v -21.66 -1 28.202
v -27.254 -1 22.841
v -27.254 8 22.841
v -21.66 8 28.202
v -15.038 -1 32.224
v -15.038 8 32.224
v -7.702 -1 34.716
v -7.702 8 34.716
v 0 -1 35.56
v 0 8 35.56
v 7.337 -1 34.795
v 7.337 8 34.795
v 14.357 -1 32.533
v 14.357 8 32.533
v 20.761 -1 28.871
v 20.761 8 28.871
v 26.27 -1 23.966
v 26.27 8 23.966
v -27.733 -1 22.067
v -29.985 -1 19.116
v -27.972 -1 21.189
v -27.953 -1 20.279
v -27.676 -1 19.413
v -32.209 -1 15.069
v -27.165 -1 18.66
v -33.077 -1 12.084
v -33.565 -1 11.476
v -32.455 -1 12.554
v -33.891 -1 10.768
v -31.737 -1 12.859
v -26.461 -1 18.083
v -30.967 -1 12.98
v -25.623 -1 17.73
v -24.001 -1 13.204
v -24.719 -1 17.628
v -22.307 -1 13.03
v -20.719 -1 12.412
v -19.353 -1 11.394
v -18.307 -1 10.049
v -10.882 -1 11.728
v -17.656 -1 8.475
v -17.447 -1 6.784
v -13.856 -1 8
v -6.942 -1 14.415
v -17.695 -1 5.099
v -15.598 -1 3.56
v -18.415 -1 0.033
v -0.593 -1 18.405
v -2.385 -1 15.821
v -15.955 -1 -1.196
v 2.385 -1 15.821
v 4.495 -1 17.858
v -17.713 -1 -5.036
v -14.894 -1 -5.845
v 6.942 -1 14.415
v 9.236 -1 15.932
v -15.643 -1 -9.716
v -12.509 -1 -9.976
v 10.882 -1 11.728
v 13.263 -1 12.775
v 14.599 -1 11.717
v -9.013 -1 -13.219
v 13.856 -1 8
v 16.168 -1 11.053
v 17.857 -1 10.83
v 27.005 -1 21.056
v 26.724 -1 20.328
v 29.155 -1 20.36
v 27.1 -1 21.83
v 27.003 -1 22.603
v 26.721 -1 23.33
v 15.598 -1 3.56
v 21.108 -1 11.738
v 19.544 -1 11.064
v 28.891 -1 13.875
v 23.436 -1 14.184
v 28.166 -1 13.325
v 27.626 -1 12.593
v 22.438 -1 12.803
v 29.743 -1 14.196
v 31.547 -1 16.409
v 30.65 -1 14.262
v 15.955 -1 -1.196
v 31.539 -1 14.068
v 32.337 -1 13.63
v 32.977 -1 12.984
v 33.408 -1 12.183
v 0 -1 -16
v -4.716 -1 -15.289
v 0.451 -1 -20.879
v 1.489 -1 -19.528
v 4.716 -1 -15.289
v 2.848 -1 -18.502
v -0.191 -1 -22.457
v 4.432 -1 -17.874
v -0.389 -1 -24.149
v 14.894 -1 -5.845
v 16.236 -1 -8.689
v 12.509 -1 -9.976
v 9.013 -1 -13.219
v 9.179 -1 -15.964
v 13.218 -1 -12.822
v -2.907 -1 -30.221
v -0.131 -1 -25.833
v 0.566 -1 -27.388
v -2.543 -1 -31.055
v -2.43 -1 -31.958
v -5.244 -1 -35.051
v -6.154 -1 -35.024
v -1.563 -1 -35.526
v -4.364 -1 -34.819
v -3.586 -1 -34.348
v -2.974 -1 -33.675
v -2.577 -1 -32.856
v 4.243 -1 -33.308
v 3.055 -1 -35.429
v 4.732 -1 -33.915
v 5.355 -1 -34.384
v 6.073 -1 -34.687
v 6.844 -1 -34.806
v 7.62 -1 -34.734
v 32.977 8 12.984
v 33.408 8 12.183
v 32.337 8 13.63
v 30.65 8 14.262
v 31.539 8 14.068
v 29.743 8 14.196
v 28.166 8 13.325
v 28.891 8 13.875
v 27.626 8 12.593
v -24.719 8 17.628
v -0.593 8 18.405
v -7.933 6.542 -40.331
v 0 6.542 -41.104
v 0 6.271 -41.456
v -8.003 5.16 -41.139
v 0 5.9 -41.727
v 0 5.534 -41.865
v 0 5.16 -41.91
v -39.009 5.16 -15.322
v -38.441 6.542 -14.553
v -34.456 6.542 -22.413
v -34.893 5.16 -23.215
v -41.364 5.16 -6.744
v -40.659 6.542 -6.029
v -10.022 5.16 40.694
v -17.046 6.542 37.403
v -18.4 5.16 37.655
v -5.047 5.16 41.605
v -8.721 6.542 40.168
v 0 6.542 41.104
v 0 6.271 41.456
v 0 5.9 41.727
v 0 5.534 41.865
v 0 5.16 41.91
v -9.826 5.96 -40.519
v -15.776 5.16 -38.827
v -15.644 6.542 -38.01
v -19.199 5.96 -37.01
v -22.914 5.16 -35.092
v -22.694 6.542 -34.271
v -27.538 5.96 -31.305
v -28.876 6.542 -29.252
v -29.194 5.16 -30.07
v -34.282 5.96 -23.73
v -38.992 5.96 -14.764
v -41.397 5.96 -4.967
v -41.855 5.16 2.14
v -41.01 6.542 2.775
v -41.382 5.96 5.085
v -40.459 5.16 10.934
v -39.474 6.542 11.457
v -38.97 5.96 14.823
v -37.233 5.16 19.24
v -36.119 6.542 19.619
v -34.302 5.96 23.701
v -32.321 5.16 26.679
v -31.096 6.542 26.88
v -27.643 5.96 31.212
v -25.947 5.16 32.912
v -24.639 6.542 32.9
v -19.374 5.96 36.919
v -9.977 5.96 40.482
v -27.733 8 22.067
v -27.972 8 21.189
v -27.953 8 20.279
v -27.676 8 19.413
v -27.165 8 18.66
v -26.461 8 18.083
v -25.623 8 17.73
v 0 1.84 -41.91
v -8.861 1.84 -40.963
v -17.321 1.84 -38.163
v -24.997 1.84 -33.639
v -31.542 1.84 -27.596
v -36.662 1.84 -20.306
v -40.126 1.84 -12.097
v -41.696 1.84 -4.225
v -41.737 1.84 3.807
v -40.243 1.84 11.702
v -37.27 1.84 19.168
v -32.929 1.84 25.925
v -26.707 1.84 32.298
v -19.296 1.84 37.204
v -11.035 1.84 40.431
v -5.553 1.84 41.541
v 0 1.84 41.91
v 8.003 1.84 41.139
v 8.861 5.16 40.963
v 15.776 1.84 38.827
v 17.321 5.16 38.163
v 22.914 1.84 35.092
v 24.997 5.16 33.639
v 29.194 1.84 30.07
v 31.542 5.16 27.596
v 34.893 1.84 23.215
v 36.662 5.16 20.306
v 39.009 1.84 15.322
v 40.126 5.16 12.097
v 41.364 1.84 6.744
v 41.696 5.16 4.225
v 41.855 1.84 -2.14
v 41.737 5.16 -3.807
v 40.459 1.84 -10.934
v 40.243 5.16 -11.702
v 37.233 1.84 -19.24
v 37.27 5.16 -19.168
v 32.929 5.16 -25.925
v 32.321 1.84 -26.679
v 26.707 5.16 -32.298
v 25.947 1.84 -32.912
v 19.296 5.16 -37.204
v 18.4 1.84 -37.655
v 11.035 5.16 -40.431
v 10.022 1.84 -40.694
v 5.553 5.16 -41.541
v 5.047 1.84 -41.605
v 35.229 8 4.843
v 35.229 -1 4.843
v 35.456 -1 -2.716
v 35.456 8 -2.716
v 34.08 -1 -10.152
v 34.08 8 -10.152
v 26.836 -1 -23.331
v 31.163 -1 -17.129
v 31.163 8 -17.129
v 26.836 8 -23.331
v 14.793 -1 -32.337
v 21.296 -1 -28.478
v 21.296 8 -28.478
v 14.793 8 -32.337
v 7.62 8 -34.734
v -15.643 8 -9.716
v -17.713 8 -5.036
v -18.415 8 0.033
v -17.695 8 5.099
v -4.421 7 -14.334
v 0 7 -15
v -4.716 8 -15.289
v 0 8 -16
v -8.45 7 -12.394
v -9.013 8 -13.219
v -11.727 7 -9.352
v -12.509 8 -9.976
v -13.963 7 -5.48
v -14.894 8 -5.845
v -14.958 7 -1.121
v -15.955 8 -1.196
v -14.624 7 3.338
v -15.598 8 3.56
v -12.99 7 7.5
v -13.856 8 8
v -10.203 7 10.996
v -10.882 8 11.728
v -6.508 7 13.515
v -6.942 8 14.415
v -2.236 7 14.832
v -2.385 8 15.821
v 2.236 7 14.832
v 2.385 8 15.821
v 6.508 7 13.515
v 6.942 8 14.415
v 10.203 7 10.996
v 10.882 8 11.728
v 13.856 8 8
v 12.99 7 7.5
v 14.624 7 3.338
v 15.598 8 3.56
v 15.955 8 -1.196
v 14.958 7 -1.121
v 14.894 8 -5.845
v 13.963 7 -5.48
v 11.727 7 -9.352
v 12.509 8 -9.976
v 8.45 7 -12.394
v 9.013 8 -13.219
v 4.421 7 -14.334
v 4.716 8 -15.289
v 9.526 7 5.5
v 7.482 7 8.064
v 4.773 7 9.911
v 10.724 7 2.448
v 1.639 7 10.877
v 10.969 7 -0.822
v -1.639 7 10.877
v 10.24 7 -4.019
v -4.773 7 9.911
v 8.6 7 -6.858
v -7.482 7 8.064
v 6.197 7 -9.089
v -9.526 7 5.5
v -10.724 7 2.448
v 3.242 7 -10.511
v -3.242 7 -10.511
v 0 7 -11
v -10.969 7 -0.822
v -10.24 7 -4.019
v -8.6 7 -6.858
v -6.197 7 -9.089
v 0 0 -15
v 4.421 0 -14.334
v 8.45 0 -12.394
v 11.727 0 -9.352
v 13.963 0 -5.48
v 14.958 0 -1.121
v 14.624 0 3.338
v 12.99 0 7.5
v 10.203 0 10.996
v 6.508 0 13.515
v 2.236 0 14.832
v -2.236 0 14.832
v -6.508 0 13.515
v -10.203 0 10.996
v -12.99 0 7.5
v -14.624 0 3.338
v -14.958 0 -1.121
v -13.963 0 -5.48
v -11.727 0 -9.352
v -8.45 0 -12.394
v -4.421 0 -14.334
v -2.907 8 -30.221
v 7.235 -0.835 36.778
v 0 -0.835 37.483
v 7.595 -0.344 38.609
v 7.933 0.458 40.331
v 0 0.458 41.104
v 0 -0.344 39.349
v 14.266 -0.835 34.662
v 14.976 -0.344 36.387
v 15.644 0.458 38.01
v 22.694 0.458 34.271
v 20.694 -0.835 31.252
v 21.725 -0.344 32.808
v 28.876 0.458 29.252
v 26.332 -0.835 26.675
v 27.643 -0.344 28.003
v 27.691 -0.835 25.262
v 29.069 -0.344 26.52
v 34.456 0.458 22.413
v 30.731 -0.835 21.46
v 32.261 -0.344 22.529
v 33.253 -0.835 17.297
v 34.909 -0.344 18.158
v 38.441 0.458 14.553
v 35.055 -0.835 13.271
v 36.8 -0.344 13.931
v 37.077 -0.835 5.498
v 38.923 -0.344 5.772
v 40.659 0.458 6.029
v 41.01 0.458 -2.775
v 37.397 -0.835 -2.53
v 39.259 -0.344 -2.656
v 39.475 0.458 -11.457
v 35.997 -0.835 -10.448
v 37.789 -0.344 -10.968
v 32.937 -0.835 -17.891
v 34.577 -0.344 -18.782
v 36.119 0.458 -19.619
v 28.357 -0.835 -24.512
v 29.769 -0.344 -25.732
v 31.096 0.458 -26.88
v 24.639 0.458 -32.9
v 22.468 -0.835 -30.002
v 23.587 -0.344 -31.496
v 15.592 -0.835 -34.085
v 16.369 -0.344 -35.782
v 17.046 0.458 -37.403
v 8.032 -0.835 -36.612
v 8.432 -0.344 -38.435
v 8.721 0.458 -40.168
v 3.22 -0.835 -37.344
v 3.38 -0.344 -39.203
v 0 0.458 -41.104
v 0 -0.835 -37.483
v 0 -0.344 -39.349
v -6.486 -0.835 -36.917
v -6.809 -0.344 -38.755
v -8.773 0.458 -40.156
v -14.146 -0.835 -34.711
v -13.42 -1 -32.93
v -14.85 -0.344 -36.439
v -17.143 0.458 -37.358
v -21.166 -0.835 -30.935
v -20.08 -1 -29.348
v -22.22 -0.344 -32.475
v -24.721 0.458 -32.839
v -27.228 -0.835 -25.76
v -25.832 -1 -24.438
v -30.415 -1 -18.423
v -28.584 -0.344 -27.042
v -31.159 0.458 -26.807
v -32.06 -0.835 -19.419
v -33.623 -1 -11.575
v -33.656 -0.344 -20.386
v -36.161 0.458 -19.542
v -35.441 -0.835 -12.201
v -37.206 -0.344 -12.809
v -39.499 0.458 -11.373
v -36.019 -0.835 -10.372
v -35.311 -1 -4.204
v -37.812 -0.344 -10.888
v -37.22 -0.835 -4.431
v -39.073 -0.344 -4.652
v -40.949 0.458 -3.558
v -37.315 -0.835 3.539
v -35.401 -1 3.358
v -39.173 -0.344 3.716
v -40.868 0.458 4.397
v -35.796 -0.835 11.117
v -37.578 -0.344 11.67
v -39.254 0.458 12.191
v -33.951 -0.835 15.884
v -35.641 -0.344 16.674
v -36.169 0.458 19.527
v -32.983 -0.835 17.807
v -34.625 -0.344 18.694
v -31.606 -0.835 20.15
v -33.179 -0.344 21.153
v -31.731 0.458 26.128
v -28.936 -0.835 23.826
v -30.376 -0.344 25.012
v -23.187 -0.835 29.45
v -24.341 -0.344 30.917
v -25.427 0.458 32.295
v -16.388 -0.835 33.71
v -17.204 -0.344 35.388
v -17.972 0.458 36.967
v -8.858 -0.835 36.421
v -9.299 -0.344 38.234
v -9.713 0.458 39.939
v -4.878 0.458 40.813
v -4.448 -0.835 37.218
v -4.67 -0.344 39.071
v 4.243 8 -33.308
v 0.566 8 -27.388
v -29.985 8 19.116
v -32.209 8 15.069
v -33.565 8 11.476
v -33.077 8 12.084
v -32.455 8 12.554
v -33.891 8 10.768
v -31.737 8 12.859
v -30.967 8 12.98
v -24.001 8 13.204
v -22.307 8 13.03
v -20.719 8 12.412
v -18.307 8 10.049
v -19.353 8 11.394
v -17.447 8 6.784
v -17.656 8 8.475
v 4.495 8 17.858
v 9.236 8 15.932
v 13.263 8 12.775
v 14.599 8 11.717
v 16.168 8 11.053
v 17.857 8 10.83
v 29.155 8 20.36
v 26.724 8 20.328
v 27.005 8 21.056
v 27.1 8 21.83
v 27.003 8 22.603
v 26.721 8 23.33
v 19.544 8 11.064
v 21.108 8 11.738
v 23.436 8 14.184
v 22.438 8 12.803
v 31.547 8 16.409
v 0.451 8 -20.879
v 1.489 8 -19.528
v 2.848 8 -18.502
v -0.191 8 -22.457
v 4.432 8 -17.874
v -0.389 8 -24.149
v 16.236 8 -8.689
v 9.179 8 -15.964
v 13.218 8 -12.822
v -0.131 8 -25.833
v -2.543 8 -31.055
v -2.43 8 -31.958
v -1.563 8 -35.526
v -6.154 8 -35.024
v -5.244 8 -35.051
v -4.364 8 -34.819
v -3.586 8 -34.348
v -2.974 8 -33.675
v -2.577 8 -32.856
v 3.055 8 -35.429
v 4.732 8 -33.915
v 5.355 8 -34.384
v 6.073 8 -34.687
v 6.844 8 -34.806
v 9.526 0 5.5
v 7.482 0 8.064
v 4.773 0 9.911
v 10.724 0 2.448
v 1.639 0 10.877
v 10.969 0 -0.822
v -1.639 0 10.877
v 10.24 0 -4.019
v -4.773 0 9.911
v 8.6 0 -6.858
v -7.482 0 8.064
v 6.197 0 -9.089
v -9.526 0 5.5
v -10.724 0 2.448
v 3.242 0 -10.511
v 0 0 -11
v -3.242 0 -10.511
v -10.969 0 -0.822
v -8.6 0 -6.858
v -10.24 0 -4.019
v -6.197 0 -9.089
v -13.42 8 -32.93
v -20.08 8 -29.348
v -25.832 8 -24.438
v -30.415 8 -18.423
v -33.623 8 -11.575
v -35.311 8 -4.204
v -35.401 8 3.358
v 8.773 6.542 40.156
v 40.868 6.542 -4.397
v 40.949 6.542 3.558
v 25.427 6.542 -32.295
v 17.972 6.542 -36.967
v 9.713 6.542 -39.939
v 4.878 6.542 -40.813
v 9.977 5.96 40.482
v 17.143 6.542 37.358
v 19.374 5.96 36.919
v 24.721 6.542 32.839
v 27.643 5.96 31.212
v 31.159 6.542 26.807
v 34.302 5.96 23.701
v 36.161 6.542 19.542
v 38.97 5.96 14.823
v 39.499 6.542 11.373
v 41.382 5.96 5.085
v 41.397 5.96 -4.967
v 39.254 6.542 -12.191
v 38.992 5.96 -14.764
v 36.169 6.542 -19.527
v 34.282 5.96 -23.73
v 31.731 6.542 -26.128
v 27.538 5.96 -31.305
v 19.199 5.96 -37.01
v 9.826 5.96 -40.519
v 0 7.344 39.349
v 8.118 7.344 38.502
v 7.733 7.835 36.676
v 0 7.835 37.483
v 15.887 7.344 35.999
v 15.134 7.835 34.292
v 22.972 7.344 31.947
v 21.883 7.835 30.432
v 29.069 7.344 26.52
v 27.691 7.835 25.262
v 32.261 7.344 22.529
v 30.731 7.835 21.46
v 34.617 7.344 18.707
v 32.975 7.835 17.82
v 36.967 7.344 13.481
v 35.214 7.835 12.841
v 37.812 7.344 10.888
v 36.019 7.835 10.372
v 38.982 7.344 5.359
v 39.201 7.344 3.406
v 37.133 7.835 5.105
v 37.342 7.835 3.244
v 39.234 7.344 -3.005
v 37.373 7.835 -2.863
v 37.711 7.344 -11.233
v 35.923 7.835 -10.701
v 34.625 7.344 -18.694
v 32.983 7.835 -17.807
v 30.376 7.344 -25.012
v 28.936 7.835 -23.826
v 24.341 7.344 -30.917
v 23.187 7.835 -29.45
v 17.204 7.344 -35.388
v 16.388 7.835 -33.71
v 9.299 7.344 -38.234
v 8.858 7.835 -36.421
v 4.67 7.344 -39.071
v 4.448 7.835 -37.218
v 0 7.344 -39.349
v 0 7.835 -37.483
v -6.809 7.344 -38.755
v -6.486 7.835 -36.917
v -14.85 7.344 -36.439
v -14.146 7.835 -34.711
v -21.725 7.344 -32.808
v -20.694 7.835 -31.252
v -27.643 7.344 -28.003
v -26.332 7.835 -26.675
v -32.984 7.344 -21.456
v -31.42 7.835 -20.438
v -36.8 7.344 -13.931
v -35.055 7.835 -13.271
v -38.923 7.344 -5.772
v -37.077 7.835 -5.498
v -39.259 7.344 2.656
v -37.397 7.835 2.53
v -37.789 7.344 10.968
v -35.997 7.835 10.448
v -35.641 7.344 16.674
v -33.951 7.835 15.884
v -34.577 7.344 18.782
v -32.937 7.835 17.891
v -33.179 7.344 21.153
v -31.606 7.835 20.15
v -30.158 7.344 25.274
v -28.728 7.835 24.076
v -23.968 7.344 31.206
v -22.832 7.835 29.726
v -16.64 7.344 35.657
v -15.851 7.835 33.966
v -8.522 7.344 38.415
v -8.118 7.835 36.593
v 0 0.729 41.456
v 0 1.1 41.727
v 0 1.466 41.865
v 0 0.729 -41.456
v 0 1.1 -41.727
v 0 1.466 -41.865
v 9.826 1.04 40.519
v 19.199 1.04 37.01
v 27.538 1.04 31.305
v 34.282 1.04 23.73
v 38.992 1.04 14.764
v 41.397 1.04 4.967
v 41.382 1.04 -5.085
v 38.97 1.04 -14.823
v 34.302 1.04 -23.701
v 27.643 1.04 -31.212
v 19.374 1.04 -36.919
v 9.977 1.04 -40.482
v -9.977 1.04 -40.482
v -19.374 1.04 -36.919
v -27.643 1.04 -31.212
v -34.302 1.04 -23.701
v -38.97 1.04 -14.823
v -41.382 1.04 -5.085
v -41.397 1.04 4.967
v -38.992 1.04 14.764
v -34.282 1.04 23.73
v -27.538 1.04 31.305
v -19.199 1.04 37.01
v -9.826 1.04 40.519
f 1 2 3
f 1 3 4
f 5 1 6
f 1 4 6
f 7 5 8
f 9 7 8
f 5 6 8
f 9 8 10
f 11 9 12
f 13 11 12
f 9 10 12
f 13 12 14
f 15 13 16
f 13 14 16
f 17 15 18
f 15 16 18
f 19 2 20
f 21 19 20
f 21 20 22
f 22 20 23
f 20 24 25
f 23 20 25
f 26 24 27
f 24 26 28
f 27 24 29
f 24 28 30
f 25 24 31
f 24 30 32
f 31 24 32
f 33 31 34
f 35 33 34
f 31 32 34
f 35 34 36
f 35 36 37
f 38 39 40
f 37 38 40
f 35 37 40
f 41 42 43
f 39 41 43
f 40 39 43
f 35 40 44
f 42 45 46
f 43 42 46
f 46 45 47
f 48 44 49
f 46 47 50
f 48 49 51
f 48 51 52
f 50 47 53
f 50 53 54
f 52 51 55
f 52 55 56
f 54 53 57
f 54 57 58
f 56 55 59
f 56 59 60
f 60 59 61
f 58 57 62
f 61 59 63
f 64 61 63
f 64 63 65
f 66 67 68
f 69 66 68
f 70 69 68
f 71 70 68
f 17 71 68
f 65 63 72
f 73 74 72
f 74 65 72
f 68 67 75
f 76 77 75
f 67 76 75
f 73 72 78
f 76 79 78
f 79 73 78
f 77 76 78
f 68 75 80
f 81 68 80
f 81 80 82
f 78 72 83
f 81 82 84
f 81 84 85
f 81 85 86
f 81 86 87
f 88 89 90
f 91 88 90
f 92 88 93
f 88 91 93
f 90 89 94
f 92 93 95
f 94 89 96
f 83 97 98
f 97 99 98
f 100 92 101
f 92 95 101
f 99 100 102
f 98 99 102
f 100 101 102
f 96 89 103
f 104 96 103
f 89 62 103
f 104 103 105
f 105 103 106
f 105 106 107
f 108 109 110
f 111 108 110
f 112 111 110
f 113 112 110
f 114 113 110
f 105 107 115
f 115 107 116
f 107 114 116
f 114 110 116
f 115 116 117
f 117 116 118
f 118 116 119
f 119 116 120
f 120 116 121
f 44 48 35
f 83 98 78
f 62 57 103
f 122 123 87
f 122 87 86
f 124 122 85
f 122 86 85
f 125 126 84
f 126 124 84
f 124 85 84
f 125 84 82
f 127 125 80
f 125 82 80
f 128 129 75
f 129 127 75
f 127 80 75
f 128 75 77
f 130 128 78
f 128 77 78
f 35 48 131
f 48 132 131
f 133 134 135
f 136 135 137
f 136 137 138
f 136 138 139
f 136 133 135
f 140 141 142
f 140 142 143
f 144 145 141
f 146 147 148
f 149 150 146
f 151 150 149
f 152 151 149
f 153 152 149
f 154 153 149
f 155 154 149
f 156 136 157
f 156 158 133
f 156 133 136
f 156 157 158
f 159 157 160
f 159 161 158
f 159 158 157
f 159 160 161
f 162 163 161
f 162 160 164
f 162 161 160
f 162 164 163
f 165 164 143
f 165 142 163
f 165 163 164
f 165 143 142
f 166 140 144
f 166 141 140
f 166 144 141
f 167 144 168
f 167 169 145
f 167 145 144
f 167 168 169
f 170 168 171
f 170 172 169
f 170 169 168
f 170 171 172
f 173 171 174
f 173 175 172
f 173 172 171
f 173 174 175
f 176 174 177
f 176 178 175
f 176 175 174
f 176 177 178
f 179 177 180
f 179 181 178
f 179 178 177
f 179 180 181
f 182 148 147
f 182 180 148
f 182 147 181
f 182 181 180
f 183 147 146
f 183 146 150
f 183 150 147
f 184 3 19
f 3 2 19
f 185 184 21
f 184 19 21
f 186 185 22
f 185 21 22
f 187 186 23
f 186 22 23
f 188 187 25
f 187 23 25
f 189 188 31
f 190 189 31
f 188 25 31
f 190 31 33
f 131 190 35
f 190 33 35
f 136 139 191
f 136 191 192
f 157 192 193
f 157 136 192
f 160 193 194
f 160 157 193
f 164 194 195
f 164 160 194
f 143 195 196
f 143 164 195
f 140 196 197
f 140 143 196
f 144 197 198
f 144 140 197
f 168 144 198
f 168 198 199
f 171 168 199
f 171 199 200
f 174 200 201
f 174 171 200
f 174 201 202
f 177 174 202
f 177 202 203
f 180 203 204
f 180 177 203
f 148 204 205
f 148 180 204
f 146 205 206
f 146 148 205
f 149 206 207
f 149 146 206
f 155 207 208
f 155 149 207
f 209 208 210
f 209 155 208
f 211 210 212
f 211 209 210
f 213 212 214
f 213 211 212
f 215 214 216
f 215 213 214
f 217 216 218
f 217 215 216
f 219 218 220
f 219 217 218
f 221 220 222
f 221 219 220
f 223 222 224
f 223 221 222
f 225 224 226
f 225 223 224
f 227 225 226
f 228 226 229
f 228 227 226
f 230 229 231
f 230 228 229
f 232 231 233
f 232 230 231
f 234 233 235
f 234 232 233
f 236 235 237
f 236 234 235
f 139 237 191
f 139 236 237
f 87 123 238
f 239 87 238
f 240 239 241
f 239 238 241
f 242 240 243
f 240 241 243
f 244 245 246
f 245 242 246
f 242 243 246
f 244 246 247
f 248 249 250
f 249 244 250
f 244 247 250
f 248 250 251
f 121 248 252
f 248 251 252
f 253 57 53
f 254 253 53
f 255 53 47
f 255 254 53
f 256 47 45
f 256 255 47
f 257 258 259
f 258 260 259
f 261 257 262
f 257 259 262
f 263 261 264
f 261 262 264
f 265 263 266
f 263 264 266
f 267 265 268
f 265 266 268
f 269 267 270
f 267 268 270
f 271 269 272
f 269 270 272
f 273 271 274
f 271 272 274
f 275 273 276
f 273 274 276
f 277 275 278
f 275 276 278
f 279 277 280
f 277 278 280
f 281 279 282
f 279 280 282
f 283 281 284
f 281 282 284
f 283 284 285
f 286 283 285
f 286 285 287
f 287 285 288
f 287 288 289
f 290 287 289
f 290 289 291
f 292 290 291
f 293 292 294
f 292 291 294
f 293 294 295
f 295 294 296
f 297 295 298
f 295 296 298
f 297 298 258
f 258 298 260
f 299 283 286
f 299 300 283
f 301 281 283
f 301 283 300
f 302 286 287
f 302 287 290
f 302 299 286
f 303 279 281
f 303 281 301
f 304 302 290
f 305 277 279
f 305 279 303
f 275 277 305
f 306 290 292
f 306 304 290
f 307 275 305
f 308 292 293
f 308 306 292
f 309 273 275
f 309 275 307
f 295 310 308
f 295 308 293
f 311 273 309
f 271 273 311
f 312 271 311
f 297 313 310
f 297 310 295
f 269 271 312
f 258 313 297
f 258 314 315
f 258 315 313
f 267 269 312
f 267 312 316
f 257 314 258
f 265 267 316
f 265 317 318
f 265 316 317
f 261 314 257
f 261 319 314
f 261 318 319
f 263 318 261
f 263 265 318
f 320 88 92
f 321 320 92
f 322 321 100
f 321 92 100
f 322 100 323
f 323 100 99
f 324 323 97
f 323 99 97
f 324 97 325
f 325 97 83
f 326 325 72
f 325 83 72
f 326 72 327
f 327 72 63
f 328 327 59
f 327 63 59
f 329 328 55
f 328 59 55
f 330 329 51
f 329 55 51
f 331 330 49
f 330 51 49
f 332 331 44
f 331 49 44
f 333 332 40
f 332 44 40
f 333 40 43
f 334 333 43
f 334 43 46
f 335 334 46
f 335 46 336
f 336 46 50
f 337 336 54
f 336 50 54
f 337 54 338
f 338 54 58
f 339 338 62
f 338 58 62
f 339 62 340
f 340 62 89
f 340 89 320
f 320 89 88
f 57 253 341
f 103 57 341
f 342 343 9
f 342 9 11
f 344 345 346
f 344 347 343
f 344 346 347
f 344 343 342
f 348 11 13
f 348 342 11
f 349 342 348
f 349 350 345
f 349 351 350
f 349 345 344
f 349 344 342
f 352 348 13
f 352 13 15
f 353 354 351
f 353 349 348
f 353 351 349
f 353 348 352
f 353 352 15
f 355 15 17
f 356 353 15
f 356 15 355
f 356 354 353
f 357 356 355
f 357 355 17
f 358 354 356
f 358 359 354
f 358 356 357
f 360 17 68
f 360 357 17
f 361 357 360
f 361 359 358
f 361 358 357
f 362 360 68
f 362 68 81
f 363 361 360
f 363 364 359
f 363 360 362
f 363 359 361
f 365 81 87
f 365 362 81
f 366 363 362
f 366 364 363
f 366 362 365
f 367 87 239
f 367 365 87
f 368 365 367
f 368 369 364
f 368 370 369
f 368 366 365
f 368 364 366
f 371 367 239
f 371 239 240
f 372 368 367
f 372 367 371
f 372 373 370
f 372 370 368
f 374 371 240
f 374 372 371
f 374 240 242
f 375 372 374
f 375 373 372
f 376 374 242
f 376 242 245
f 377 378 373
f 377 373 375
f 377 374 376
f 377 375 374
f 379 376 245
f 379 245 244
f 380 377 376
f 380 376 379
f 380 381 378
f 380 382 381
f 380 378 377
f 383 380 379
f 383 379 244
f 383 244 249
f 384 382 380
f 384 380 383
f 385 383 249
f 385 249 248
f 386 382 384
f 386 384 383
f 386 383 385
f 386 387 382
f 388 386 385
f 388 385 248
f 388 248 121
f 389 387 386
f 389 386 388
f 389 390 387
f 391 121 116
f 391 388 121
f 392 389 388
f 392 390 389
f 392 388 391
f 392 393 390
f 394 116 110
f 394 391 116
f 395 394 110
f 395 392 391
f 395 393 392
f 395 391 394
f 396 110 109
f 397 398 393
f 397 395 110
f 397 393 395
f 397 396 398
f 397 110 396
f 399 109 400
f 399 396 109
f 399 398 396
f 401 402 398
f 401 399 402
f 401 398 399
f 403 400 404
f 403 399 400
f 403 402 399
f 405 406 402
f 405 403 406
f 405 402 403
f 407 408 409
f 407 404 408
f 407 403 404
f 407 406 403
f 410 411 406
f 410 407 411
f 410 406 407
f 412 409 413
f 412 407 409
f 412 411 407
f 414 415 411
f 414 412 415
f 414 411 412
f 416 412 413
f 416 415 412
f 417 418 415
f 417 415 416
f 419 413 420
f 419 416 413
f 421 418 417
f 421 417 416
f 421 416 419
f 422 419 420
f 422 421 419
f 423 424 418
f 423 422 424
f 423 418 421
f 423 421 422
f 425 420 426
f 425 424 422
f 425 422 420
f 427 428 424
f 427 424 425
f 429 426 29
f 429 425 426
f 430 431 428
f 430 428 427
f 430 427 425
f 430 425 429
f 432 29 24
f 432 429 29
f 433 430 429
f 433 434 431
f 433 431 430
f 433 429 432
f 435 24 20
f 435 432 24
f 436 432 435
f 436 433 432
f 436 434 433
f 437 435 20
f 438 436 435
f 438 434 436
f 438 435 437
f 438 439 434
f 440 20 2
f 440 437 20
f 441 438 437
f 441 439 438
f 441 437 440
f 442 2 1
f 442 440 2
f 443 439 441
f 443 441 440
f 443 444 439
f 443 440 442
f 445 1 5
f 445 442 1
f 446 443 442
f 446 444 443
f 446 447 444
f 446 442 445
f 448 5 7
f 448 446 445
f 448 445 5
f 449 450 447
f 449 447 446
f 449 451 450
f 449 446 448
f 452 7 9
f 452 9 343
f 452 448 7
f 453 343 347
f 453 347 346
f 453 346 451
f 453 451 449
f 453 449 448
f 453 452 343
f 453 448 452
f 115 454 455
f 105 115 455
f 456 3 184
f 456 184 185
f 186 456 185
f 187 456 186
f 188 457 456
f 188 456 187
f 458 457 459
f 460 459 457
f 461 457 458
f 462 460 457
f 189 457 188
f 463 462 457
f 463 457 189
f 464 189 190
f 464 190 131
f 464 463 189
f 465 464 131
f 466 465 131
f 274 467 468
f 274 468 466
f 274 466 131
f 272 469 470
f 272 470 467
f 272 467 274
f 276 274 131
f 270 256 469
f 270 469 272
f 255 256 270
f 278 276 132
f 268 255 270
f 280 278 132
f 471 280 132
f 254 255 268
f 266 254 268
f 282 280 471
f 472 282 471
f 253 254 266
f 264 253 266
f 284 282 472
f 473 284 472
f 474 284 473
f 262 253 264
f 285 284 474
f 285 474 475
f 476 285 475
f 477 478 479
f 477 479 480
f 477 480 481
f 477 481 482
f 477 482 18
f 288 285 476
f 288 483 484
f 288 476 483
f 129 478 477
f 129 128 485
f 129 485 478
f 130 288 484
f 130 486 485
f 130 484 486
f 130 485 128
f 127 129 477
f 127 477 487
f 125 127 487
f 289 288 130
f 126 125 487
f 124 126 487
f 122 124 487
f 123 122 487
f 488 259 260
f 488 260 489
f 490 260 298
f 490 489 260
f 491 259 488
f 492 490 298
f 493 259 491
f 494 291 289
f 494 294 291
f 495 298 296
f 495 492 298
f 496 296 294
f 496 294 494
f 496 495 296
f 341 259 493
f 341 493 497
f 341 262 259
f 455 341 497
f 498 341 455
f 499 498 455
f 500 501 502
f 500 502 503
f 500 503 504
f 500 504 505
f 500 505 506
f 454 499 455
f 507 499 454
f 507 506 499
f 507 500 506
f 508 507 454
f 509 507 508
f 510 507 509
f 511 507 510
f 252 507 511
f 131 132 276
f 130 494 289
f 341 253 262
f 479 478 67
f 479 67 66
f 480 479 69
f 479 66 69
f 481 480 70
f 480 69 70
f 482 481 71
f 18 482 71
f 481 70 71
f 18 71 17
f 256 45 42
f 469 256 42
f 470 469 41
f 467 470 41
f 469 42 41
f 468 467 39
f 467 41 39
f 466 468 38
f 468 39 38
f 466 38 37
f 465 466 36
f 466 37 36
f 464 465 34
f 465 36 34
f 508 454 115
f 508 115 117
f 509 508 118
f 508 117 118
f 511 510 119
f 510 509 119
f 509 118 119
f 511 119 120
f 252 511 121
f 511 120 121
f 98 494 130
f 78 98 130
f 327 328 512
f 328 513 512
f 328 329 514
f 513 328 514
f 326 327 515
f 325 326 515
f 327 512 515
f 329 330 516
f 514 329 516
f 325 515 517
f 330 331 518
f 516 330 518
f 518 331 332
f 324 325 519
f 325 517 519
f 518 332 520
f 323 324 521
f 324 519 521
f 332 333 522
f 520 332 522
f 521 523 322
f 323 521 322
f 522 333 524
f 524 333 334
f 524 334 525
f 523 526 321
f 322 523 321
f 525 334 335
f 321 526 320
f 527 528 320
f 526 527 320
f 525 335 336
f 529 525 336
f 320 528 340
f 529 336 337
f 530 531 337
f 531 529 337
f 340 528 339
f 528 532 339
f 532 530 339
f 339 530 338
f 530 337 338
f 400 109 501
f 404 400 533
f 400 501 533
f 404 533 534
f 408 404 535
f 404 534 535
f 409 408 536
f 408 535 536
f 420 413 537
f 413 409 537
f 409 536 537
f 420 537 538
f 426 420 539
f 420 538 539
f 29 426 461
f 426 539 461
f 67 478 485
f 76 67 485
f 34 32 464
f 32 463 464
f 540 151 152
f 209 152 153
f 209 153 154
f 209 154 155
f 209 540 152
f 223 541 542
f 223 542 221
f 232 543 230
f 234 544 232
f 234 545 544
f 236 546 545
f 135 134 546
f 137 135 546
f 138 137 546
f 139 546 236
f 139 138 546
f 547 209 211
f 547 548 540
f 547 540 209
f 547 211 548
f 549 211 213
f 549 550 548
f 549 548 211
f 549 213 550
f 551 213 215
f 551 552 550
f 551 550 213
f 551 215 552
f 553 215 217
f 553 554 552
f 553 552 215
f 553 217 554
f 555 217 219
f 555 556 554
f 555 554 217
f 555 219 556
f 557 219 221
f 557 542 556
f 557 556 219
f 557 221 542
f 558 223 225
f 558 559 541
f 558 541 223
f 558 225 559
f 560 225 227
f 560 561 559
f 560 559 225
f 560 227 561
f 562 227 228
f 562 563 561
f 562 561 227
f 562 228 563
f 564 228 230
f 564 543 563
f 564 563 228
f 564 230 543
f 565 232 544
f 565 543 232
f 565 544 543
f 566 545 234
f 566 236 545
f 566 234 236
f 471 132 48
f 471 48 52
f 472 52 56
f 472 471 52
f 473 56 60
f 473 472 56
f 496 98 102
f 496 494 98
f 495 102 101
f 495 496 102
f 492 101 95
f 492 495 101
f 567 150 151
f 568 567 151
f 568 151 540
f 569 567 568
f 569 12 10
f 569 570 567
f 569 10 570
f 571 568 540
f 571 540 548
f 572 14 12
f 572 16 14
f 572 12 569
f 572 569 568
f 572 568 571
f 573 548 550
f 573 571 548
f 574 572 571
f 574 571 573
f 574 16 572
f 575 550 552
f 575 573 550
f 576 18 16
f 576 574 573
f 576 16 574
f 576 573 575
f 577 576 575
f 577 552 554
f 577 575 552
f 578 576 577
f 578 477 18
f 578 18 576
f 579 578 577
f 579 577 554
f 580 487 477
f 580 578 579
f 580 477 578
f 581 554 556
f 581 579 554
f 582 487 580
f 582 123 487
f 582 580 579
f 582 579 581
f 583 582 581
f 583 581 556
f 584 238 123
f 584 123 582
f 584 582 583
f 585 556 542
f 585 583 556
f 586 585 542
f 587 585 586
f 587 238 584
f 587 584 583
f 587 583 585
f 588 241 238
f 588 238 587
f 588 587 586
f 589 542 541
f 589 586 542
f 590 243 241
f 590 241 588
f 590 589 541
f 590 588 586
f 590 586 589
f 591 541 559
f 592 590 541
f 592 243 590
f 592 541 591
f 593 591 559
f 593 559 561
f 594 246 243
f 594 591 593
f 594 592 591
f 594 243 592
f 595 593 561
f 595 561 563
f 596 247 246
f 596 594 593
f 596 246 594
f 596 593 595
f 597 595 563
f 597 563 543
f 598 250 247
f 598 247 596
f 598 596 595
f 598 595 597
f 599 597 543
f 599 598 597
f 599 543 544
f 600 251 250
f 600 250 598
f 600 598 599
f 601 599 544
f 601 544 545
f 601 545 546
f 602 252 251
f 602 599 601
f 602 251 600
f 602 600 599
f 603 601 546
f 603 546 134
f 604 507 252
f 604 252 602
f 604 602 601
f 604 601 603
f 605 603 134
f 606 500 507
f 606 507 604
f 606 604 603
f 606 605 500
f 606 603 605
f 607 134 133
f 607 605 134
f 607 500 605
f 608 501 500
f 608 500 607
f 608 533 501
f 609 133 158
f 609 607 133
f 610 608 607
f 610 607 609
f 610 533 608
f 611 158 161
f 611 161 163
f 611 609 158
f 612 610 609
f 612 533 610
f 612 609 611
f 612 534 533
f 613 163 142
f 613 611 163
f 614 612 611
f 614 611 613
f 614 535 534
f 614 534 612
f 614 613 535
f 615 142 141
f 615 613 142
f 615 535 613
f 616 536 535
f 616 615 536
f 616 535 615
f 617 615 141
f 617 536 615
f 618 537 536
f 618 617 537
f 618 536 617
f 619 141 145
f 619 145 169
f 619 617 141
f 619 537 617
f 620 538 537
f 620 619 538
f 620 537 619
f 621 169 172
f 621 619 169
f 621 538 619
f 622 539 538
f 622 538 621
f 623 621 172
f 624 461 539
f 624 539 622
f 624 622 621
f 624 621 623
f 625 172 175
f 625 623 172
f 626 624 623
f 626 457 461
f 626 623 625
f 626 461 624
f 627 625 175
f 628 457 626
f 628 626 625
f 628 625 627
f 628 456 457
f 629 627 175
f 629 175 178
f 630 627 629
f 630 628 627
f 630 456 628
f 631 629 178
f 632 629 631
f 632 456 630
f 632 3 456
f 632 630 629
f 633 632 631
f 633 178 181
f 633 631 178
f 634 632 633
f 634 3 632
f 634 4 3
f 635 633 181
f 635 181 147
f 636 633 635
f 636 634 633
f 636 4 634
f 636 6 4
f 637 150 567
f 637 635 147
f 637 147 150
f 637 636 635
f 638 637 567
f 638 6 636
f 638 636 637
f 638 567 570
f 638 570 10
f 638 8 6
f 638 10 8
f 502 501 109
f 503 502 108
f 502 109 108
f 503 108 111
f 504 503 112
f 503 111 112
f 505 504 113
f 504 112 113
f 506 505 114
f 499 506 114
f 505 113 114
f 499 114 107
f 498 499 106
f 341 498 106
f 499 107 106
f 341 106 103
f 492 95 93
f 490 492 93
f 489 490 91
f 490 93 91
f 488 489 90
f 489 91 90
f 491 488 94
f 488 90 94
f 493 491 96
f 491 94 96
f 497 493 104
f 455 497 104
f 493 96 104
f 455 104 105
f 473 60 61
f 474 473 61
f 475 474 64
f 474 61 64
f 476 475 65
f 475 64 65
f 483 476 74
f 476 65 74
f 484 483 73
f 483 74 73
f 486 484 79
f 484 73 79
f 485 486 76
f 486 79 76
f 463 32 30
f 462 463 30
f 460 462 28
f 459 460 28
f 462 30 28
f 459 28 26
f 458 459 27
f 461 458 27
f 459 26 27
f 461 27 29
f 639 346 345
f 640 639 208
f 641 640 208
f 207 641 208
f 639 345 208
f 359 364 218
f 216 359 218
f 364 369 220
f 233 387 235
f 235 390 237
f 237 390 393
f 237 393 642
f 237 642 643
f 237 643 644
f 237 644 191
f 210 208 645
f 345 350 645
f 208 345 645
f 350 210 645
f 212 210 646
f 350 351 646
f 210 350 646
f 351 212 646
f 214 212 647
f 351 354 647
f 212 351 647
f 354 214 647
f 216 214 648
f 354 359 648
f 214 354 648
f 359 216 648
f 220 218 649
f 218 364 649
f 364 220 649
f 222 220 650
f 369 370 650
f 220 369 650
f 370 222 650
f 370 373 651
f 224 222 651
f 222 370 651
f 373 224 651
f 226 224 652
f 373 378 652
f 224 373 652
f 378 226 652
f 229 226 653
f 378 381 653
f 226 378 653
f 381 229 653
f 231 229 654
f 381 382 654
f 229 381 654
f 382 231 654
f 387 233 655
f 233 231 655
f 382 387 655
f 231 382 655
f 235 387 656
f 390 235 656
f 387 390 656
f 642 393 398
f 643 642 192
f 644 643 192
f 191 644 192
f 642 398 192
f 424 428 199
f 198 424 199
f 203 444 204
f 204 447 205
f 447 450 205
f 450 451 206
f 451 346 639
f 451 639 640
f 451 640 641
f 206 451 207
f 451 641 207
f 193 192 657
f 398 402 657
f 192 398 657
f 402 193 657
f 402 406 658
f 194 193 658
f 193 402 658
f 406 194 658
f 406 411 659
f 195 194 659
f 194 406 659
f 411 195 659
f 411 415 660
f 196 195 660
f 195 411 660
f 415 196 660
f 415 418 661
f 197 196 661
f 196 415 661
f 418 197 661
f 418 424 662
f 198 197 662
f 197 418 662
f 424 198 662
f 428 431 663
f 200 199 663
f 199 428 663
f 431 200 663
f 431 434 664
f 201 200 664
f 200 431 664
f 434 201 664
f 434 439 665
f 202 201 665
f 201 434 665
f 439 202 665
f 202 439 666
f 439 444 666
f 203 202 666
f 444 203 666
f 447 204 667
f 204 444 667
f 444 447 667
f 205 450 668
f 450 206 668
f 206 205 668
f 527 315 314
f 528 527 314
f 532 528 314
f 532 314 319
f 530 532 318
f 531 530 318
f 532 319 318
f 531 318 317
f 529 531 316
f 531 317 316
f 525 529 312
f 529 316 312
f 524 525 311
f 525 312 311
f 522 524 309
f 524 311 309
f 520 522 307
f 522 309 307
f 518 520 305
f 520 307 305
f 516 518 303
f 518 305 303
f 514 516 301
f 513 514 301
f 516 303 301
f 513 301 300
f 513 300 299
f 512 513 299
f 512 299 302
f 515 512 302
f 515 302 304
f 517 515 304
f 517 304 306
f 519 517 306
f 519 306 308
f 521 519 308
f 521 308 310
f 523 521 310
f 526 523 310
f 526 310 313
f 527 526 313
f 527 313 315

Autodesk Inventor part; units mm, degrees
ref_plane "YZ Plane" through (0, 0, 0) normal (1, 0, 0) x (0, 1, 0)
sketch "Sketch3" plane through (0, 0, 0) normal (1, 0, 0) x (0, 1, 0)
  line L0 (0, 0) -> (0, -11) construction
  line L1 (0, 0) -> (7, 0) construction
  line L2 (7, 0) -> (7, -11) construction
  line L3 (0, -11) -> (0, -41.91)
  line L4 (0, -41.91) -> (-1.9706, -41.91) construction
  line L5 (0, -11) -> (7, -11)
  line L6 (7, -11) -> (7, -41.91)
  line L7 (0, -41.91) -> (0, -39.6842) construction
  line L8 (0, -41.91) -> (7, -41.91)
  dimension "d7" = 7
  dimension "d8" = 11
  dimension "d9" = 41.91
revolve "Revolution1" add sketch "Sketch3" angle 360 about axis through (0, 0, 0) along (0, 1, 0)
ref_plane "Work Plane2" through (0, 0, 0) normal (-1, 0, 0) x (0, 1, 0)
sketch "Sketch4" plane through (0, 0, 0) normal (-1, 0, 0) x (0, 1, 0)
  line L0 (0, 0) -> (7, 0)
  line L1 (7, 41.91) -> (7, -41.91) projected
  line L2 (7, 0) -> (7, 11)
  line L3 (7, 0) -> (8, 0)
  line L4 (8, 0) -> (8, 15)
  line L5 (8, 15) -> (7, 15)
  line L6 (8, 15) -> (8, 41.91)
  line L7 (8, 41.91) -> (7, 41.91)
  line L8 (0, 0) -> (0, 0.75)
  line L9 (0, 11) -> (0, -11) projected
  line L10 (8, 15) -> (0, 15)
  line L11 (0, 41.91) -> (0, -41.91) projected
  line L12 (0, 15) -> (-1, 15)
  line L13 (-1, 15) -> (-1, 41.91)
  line L14 (-1, 41.91) -> (0, 41.91)
  dimension "d16" = 11
  dimension "d17" = 1
  dimension "d18" = 15
  dimension "d20" = 0.75
  dimension "d21" = 1
ref_plane "Work Plane3" through (0, 3.5, 0) normal (0, 1, 0) x (1, 0, 0)
revolve "Revolution2" add sketch "Sketch4" angle 360 about axis through (0, 0, 0) along (0, 1, 0) contours L12 L13 L14 L11 | L1 L7 L6 L5
sketch "Sketch5" plane through (0, 8, 0) normal (0, 1, 0) x (1, 0, 0)
  circle A0 centre (0, 0) radius 18.415
  circle A1 centre (0, 0) radius 15 projected
  circle A2 centre (0, 0) radius 41.91 projected
  circle A3 centre (0, 0) radius 35.56
  dimension "d23" = 6.35
  dimension "d49" = 36.83
extrude "Extrusion2" cut sketch "Sketch5" against normal through all contours A3
sketch "Sketch6" plane through (0, 8, 0) normal (0, 1, 0) x (1, 0, 0)
  circle A0 centre (0, 0) radius 18.415 projected
  circle A1 centre (0, 0) radius 35.56 projected
  line L0 (16.2361, 8.6892) -> (30.5901, -18.1318)
  line L1 (27.7471, -22.2399) -> (17.9783, -3.9865)
  dimension "d26" = 4.445
extrude "Extrusion3" add sketch "Sketch6" against normal up to surface (9 mm away) contours A0 L0 A1 L1 picked at (22.3912, -5.043)
pattern_circular "Circular Pattern1" count 3 over 360 about axis through (0, 3.5, 0) along (0, -1, 0) of "Extrusion3"
fillet "Fillet1" radius 6.35 3 edges at (-5.5367, 3.5, -17.5629) (17.9783, 3.5, 3.9865) (-12.4416, 3.5, 13.5764)
fillet "Fillet1" radius 3.175 3 edges at (27.7471, 3.5, 22.2399) (-33.1338, 3.5, 12.9098) (5.3867, 3.5, -35.1496)
fillet "Fillet1" radius 3.175 3 edges at (0.4075, 3.5, -35.5577) (-30.9976, 3.5, 17.4259) (30.5901, 3.5, 18.1318)
sketch "Sketch7" plane through (0, 0, 0) normal (-1, 0, 0) x (0, 1, 0)
  line L0 (8, -41.91) -> (8, 41.91) projected
  line L1 (-1, -41.91) -> (-1, 41.91) projected
  line L2 (8, -41.91) -> (-1, -41.91) projected
  arc A0 (6.04, -41.91) -> (8, -35.56) centre (-3.2664, -35.56) ccw
  arc A1 (-1, -35.56) -> (0.96, -41.91) centre (10.2664, -35.56) ccw
  line L3 (0.96, -41.91) -> (6.04, -41.91)
  line L4 (-1, -35.56) -> (8, -35.56)
  line L5 (8, -22.8409) -> (-1, -22.8409) projected
  line L6 (8, -23.9663) -> (8, -35.56) projected
  line L7 (-1, -23.9663) -> (8, -23.9663) projected
  line L8 (-1, -22.8409) -> (-1, -23.9663) projected
  line L9 (8, -35.56) -> (8, -35.56) projected
  line L10 (0, 0) -> (11.7377, 0)
  dimension "d36" = 6.35
  dimension "d37" = 5.08
revolve "Revolution3" cut sketch "Sketch7" angle 360 about axis through (0, 0, 0) along (0, 1, 0) contours L2 A0 L0 | A1 L2 L1
fillet "Fillet2" radius 1.5875 4 edges at (41.91, 6.04, 0) (-41.91, 6.04, 0) (-41.91, 0.96, 0) (41.91, 0.96, 0)
chamfer "Chamfer1" distance 1 distance2 1 1 edges at (0, 8, 15) measured on face at (1.207, 7.3333, -14.9514)
chamfer "Chamfer2" distance 1 angle 45 1 edges at (0, -1, 15)
properties part number "Spinner 1"
